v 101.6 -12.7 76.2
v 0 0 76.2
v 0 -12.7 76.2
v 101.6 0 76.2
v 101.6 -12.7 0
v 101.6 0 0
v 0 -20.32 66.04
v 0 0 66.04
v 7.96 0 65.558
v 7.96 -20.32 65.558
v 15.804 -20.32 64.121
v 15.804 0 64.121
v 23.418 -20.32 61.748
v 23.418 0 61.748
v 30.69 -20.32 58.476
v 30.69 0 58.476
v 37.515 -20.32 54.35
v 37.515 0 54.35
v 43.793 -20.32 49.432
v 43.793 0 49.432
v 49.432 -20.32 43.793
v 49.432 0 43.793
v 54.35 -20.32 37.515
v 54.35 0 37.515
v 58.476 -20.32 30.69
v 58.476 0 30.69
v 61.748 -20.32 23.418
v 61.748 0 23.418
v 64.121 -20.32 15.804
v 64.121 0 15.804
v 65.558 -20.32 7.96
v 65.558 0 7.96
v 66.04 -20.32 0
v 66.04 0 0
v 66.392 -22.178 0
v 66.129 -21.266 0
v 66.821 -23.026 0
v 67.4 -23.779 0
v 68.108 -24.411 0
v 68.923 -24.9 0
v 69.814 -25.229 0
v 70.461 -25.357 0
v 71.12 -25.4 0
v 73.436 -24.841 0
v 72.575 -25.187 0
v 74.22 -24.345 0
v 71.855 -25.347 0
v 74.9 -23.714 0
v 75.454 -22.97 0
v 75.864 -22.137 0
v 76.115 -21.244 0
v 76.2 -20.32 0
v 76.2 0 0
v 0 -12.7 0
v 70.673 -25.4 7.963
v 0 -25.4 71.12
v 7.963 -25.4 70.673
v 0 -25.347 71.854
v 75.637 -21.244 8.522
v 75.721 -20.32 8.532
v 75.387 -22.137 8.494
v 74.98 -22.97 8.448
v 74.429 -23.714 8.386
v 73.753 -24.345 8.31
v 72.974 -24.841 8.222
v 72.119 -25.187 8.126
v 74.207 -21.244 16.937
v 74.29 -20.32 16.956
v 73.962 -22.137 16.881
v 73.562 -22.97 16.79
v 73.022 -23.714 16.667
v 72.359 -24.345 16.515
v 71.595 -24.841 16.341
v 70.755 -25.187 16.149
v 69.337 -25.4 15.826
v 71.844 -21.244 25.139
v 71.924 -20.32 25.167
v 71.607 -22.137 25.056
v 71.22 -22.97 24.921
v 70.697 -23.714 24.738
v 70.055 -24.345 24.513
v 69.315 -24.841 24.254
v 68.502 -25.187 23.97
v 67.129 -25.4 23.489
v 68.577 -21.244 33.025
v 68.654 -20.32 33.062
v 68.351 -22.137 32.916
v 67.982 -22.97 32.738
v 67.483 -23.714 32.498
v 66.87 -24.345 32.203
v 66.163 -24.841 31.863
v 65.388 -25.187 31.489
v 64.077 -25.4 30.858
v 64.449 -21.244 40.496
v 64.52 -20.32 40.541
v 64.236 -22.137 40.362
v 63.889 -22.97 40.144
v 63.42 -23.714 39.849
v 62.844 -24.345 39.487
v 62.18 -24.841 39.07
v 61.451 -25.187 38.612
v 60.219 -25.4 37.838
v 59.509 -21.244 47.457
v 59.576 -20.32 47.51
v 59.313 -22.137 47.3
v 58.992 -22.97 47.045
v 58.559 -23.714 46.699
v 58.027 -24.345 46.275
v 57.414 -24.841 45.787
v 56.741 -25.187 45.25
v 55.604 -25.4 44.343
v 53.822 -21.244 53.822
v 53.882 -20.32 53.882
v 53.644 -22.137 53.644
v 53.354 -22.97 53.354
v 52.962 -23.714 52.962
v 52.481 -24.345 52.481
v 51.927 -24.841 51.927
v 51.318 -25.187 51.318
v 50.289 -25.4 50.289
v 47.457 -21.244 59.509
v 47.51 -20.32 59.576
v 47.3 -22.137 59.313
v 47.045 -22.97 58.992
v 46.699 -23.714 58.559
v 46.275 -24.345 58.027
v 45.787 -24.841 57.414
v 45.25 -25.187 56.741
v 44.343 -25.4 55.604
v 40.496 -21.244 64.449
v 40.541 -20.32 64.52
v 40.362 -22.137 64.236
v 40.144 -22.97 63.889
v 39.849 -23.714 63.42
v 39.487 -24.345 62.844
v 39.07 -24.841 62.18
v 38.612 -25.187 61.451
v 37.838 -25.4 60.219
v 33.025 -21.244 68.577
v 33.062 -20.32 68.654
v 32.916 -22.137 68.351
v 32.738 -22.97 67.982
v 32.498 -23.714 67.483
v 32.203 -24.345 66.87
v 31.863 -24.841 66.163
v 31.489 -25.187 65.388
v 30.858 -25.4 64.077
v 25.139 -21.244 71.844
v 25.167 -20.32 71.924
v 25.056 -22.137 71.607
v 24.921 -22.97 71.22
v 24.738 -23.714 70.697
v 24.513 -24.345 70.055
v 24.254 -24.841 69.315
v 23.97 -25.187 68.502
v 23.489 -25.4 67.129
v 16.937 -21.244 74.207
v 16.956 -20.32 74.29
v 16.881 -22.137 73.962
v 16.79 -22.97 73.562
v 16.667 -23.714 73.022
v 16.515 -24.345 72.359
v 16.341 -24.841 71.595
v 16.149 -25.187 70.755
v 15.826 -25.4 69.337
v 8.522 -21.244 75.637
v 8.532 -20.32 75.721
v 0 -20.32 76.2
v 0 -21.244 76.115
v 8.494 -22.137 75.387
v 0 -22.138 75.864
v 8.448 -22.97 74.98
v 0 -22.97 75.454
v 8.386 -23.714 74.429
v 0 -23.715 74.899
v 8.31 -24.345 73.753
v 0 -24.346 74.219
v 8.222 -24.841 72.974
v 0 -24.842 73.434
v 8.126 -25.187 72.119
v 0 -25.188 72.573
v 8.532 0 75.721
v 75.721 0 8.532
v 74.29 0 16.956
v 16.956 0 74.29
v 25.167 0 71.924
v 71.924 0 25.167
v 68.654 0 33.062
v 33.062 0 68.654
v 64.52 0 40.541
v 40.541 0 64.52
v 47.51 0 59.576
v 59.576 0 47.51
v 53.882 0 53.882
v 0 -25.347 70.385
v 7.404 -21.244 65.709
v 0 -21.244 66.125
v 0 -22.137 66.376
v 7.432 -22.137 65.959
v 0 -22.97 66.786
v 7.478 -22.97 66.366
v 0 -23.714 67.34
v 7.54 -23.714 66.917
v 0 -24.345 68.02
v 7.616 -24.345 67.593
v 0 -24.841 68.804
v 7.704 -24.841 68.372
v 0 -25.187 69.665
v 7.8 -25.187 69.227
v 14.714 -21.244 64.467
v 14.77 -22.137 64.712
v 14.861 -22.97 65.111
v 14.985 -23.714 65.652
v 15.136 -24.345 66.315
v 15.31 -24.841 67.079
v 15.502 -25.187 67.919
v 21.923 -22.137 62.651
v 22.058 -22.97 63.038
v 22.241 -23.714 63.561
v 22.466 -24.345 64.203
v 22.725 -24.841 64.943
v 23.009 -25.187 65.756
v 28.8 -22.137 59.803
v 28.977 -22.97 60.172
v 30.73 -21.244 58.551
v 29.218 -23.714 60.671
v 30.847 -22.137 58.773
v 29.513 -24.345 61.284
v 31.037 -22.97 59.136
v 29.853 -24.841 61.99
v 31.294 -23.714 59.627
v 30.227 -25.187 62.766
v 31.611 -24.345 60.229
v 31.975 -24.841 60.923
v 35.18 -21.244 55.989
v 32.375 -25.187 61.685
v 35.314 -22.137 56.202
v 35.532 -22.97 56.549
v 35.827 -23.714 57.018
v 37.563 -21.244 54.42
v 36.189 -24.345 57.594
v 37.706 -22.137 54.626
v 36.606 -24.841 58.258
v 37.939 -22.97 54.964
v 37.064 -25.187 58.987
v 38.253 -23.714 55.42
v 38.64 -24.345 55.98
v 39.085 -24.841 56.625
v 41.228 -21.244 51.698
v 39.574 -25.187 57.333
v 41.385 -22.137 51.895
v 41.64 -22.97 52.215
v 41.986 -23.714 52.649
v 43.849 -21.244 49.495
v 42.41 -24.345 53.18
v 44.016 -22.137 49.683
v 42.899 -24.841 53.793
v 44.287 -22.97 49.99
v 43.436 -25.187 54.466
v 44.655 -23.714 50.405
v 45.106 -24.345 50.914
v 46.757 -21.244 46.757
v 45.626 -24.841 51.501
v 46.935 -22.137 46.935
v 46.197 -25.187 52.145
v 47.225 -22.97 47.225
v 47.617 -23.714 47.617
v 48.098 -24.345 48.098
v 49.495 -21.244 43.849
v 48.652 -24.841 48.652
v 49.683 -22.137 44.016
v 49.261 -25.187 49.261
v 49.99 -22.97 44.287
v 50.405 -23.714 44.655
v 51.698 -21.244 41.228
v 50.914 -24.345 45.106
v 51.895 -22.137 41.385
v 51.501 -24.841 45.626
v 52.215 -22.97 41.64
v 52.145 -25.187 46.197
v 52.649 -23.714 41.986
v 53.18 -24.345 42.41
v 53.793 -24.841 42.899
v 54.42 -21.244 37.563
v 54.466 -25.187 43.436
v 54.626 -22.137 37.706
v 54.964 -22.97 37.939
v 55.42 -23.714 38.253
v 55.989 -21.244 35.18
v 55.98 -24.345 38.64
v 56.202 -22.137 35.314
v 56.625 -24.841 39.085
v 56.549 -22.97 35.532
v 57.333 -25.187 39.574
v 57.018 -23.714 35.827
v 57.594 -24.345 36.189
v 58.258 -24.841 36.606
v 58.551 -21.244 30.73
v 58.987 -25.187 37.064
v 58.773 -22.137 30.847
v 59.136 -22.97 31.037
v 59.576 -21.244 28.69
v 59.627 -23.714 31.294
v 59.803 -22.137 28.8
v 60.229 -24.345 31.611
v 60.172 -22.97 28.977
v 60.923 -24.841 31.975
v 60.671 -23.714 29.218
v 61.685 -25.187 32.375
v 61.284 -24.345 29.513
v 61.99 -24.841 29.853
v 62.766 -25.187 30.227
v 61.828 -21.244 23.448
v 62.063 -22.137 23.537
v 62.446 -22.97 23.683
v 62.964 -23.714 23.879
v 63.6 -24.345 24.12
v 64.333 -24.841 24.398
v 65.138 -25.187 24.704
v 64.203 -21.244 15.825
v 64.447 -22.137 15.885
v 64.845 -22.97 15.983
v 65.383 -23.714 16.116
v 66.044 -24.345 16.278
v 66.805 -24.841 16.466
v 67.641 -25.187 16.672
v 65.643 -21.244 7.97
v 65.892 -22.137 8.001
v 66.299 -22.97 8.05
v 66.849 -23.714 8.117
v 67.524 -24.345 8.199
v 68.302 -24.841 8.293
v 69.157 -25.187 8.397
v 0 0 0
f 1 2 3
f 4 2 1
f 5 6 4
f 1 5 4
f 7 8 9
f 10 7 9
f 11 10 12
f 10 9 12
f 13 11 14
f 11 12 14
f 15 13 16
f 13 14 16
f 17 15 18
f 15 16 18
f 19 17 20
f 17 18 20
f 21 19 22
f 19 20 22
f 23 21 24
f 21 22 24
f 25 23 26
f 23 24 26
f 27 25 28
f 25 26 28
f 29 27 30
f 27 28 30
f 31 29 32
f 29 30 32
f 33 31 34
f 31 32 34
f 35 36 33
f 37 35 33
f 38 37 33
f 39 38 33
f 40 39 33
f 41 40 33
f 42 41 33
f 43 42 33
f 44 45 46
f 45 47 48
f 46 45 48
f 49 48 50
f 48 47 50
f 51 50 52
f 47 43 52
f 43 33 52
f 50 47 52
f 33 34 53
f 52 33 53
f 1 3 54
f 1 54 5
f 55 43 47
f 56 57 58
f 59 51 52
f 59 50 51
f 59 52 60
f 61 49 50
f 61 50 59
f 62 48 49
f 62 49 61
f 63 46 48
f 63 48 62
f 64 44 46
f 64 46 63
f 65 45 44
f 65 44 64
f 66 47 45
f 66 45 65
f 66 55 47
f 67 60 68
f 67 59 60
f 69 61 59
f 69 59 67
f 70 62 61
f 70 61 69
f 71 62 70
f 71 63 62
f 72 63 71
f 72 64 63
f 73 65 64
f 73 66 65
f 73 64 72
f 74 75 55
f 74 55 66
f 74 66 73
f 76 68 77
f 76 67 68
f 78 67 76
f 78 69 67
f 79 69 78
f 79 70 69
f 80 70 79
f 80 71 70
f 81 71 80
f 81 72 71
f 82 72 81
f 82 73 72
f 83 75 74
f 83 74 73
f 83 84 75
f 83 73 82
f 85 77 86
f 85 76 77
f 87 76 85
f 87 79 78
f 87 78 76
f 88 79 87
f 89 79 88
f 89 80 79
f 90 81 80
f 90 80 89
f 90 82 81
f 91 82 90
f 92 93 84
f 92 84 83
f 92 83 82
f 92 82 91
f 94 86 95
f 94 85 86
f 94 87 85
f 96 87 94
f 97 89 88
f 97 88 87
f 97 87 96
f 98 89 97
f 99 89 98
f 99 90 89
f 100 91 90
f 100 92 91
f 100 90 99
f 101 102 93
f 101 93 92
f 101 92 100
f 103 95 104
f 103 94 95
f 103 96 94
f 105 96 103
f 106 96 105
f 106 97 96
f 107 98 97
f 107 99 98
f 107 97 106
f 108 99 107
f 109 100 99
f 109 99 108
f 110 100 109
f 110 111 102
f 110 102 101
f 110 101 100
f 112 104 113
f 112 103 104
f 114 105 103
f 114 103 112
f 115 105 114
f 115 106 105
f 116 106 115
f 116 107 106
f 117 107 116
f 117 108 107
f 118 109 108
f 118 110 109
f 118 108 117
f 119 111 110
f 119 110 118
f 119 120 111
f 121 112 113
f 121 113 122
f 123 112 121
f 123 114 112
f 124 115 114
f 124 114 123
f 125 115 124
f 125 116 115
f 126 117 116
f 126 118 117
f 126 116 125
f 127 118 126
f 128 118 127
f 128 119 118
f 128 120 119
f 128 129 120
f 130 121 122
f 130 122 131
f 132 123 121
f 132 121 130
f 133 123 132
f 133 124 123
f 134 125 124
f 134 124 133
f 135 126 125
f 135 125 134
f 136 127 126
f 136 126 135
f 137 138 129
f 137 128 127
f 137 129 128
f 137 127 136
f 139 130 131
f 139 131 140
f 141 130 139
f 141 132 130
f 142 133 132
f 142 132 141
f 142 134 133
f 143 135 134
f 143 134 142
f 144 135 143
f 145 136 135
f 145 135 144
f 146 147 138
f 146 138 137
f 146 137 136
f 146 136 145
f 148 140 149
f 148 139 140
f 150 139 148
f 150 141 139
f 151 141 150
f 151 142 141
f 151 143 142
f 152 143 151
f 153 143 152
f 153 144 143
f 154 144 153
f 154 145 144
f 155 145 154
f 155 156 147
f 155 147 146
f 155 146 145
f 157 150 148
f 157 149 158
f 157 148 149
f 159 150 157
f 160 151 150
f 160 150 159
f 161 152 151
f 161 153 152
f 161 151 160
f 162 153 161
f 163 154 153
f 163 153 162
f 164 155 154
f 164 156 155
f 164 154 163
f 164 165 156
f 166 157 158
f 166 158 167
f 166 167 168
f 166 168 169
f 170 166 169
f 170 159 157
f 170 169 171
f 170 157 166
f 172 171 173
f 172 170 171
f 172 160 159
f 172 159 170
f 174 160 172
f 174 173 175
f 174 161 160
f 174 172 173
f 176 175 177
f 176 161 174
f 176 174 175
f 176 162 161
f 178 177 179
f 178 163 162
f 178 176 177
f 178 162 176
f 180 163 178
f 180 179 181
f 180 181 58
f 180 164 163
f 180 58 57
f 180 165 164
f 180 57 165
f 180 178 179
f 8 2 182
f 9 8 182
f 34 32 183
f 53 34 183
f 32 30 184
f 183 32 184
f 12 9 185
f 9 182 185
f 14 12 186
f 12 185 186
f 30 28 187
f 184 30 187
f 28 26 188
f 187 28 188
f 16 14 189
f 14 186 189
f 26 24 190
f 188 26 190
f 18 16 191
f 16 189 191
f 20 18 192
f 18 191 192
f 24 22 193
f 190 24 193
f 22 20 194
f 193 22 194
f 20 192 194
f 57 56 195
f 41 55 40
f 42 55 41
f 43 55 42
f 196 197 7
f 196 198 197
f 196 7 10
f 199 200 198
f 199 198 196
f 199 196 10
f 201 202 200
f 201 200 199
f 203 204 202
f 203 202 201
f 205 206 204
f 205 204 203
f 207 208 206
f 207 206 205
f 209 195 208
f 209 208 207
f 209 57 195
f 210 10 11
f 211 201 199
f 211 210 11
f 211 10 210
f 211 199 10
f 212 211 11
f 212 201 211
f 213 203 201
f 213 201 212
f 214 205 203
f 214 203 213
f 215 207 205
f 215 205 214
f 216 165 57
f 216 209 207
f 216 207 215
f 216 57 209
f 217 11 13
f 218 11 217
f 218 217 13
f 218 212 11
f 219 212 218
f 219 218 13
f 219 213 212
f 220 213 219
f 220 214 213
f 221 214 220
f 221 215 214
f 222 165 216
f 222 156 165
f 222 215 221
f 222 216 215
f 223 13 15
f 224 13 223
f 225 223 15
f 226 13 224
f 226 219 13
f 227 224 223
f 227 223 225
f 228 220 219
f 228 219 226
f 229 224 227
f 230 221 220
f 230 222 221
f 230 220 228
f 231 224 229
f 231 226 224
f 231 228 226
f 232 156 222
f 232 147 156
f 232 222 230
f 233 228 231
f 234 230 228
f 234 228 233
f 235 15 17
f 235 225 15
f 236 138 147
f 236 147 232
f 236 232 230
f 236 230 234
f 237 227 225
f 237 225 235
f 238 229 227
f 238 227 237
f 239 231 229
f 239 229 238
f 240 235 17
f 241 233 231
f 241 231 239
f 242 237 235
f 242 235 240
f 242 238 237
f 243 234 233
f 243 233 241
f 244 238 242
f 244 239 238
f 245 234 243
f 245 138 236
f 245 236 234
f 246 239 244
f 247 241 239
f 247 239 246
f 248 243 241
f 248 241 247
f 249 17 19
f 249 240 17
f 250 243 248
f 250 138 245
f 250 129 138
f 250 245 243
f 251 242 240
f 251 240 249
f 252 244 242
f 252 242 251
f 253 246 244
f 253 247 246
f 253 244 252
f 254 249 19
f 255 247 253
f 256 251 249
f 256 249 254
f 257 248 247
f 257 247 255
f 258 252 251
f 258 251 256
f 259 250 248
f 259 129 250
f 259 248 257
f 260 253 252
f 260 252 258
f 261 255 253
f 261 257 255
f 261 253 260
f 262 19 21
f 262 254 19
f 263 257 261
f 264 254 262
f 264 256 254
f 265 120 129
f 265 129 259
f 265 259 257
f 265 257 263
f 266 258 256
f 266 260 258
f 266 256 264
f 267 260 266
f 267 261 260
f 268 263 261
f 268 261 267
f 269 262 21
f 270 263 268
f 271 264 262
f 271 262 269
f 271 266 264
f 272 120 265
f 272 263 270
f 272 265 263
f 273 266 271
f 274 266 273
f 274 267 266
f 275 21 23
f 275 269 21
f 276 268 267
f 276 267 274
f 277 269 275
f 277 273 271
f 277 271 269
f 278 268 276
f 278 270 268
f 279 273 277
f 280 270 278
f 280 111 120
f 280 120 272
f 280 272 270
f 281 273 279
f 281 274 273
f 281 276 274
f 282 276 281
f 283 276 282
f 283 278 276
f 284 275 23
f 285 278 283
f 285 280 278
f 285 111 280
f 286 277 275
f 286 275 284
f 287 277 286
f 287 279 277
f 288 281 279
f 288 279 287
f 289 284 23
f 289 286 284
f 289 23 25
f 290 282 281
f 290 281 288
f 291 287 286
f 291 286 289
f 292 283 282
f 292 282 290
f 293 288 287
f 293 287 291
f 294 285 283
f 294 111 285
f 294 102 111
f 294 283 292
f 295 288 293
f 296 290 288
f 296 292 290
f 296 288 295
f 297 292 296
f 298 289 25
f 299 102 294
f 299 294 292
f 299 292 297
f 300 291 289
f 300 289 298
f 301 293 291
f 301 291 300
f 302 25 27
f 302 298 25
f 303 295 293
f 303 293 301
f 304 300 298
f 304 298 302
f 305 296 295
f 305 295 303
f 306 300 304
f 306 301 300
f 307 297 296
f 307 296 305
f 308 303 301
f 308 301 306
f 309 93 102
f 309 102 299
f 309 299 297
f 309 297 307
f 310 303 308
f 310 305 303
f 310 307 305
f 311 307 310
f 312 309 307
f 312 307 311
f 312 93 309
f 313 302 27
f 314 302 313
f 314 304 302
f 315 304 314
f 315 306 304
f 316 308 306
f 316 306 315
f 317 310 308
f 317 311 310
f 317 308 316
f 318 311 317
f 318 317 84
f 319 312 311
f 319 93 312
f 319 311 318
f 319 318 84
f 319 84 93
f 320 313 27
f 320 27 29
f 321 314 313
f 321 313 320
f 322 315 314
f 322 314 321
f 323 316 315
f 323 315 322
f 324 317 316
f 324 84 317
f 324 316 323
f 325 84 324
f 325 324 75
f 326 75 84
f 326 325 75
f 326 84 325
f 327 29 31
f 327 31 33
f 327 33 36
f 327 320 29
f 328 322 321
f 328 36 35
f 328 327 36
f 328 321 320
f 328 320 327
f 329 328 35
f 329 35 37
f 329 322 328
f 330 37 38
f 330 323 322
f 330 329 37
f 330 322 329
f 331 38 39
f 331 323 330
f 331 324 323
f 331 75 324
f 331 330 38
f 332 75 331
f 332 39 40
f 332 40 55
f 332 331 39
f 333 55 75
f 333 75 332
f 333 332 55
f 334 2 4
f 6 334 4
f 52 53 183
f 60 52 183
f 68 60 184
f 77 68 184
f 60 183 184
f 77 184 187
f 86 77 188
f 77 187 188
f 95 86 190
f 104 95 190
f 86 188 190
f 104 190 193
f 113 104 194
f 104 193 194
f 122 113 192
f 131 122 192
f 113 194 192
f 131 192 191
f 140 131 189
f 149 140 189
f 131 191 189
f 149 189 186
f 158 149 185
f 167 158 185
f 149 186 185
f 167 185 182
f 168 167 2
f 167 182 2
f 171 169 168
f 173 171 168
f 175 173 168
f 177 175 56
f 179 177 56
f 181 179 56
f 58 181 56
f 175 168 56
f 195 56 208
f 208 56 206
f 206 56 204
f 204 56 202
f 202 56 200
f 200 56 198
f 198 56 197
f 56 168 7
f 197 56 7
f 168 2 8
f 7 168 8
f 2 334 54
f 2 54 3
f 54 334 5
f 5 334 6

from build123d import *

# Parameters (mm, degrees)
F0_W     = 101.6
F0_H     = 76.2
F1_DEPTH = 12.7
F3_DEPTH = 25.4
F4_R     = 5.07999


# Not quite as in the source:
# - a fillet or chamfer is up to 0.001 mm smaller than in the source, because OpenCascade refuses the exact size


with BuildPart() as f1:
    # F0 (on Front) → F1 (new body)
    with BuildSketch(Plane.XZ):
        with Locations((50.8, 38.1)):
            Rectangle(F0_W, F0_H)
    extrude(amount=F1_DEPTH)


with BuildPart() as f3:
    # F2 (on Front) → F3 (new body)
    with BuildSketch(Plane.XZ):
        with BuildLine():
            ThreePointArc((76.2, 0), (53.8815367264, 53.8815367264), (0, 76.2))
            Line((0, 76.2), (0, 66.04))
            ThreePointArc((0, 66.04), (46.6973318296, 46.6973318296), (66.04, 0))
            Line((66.04, 0), (76.2, 0))
        make_face()
    extrude(amount=F3_DEPTH)

    # F4 (radius 5.08 in the source; OpenCascade refuses exactly that, so slightly less here)
    f4_edges = [f3.edges().sort_by_distance(p)[0] for p in [
        (46.697332, -25.4, 46.697332),
        (53.881537, -25.4, 53.881537),
    ]]
    fillet(f4_edges, radius=F4_R)


solid = Compound([f1.part, f3.part])
